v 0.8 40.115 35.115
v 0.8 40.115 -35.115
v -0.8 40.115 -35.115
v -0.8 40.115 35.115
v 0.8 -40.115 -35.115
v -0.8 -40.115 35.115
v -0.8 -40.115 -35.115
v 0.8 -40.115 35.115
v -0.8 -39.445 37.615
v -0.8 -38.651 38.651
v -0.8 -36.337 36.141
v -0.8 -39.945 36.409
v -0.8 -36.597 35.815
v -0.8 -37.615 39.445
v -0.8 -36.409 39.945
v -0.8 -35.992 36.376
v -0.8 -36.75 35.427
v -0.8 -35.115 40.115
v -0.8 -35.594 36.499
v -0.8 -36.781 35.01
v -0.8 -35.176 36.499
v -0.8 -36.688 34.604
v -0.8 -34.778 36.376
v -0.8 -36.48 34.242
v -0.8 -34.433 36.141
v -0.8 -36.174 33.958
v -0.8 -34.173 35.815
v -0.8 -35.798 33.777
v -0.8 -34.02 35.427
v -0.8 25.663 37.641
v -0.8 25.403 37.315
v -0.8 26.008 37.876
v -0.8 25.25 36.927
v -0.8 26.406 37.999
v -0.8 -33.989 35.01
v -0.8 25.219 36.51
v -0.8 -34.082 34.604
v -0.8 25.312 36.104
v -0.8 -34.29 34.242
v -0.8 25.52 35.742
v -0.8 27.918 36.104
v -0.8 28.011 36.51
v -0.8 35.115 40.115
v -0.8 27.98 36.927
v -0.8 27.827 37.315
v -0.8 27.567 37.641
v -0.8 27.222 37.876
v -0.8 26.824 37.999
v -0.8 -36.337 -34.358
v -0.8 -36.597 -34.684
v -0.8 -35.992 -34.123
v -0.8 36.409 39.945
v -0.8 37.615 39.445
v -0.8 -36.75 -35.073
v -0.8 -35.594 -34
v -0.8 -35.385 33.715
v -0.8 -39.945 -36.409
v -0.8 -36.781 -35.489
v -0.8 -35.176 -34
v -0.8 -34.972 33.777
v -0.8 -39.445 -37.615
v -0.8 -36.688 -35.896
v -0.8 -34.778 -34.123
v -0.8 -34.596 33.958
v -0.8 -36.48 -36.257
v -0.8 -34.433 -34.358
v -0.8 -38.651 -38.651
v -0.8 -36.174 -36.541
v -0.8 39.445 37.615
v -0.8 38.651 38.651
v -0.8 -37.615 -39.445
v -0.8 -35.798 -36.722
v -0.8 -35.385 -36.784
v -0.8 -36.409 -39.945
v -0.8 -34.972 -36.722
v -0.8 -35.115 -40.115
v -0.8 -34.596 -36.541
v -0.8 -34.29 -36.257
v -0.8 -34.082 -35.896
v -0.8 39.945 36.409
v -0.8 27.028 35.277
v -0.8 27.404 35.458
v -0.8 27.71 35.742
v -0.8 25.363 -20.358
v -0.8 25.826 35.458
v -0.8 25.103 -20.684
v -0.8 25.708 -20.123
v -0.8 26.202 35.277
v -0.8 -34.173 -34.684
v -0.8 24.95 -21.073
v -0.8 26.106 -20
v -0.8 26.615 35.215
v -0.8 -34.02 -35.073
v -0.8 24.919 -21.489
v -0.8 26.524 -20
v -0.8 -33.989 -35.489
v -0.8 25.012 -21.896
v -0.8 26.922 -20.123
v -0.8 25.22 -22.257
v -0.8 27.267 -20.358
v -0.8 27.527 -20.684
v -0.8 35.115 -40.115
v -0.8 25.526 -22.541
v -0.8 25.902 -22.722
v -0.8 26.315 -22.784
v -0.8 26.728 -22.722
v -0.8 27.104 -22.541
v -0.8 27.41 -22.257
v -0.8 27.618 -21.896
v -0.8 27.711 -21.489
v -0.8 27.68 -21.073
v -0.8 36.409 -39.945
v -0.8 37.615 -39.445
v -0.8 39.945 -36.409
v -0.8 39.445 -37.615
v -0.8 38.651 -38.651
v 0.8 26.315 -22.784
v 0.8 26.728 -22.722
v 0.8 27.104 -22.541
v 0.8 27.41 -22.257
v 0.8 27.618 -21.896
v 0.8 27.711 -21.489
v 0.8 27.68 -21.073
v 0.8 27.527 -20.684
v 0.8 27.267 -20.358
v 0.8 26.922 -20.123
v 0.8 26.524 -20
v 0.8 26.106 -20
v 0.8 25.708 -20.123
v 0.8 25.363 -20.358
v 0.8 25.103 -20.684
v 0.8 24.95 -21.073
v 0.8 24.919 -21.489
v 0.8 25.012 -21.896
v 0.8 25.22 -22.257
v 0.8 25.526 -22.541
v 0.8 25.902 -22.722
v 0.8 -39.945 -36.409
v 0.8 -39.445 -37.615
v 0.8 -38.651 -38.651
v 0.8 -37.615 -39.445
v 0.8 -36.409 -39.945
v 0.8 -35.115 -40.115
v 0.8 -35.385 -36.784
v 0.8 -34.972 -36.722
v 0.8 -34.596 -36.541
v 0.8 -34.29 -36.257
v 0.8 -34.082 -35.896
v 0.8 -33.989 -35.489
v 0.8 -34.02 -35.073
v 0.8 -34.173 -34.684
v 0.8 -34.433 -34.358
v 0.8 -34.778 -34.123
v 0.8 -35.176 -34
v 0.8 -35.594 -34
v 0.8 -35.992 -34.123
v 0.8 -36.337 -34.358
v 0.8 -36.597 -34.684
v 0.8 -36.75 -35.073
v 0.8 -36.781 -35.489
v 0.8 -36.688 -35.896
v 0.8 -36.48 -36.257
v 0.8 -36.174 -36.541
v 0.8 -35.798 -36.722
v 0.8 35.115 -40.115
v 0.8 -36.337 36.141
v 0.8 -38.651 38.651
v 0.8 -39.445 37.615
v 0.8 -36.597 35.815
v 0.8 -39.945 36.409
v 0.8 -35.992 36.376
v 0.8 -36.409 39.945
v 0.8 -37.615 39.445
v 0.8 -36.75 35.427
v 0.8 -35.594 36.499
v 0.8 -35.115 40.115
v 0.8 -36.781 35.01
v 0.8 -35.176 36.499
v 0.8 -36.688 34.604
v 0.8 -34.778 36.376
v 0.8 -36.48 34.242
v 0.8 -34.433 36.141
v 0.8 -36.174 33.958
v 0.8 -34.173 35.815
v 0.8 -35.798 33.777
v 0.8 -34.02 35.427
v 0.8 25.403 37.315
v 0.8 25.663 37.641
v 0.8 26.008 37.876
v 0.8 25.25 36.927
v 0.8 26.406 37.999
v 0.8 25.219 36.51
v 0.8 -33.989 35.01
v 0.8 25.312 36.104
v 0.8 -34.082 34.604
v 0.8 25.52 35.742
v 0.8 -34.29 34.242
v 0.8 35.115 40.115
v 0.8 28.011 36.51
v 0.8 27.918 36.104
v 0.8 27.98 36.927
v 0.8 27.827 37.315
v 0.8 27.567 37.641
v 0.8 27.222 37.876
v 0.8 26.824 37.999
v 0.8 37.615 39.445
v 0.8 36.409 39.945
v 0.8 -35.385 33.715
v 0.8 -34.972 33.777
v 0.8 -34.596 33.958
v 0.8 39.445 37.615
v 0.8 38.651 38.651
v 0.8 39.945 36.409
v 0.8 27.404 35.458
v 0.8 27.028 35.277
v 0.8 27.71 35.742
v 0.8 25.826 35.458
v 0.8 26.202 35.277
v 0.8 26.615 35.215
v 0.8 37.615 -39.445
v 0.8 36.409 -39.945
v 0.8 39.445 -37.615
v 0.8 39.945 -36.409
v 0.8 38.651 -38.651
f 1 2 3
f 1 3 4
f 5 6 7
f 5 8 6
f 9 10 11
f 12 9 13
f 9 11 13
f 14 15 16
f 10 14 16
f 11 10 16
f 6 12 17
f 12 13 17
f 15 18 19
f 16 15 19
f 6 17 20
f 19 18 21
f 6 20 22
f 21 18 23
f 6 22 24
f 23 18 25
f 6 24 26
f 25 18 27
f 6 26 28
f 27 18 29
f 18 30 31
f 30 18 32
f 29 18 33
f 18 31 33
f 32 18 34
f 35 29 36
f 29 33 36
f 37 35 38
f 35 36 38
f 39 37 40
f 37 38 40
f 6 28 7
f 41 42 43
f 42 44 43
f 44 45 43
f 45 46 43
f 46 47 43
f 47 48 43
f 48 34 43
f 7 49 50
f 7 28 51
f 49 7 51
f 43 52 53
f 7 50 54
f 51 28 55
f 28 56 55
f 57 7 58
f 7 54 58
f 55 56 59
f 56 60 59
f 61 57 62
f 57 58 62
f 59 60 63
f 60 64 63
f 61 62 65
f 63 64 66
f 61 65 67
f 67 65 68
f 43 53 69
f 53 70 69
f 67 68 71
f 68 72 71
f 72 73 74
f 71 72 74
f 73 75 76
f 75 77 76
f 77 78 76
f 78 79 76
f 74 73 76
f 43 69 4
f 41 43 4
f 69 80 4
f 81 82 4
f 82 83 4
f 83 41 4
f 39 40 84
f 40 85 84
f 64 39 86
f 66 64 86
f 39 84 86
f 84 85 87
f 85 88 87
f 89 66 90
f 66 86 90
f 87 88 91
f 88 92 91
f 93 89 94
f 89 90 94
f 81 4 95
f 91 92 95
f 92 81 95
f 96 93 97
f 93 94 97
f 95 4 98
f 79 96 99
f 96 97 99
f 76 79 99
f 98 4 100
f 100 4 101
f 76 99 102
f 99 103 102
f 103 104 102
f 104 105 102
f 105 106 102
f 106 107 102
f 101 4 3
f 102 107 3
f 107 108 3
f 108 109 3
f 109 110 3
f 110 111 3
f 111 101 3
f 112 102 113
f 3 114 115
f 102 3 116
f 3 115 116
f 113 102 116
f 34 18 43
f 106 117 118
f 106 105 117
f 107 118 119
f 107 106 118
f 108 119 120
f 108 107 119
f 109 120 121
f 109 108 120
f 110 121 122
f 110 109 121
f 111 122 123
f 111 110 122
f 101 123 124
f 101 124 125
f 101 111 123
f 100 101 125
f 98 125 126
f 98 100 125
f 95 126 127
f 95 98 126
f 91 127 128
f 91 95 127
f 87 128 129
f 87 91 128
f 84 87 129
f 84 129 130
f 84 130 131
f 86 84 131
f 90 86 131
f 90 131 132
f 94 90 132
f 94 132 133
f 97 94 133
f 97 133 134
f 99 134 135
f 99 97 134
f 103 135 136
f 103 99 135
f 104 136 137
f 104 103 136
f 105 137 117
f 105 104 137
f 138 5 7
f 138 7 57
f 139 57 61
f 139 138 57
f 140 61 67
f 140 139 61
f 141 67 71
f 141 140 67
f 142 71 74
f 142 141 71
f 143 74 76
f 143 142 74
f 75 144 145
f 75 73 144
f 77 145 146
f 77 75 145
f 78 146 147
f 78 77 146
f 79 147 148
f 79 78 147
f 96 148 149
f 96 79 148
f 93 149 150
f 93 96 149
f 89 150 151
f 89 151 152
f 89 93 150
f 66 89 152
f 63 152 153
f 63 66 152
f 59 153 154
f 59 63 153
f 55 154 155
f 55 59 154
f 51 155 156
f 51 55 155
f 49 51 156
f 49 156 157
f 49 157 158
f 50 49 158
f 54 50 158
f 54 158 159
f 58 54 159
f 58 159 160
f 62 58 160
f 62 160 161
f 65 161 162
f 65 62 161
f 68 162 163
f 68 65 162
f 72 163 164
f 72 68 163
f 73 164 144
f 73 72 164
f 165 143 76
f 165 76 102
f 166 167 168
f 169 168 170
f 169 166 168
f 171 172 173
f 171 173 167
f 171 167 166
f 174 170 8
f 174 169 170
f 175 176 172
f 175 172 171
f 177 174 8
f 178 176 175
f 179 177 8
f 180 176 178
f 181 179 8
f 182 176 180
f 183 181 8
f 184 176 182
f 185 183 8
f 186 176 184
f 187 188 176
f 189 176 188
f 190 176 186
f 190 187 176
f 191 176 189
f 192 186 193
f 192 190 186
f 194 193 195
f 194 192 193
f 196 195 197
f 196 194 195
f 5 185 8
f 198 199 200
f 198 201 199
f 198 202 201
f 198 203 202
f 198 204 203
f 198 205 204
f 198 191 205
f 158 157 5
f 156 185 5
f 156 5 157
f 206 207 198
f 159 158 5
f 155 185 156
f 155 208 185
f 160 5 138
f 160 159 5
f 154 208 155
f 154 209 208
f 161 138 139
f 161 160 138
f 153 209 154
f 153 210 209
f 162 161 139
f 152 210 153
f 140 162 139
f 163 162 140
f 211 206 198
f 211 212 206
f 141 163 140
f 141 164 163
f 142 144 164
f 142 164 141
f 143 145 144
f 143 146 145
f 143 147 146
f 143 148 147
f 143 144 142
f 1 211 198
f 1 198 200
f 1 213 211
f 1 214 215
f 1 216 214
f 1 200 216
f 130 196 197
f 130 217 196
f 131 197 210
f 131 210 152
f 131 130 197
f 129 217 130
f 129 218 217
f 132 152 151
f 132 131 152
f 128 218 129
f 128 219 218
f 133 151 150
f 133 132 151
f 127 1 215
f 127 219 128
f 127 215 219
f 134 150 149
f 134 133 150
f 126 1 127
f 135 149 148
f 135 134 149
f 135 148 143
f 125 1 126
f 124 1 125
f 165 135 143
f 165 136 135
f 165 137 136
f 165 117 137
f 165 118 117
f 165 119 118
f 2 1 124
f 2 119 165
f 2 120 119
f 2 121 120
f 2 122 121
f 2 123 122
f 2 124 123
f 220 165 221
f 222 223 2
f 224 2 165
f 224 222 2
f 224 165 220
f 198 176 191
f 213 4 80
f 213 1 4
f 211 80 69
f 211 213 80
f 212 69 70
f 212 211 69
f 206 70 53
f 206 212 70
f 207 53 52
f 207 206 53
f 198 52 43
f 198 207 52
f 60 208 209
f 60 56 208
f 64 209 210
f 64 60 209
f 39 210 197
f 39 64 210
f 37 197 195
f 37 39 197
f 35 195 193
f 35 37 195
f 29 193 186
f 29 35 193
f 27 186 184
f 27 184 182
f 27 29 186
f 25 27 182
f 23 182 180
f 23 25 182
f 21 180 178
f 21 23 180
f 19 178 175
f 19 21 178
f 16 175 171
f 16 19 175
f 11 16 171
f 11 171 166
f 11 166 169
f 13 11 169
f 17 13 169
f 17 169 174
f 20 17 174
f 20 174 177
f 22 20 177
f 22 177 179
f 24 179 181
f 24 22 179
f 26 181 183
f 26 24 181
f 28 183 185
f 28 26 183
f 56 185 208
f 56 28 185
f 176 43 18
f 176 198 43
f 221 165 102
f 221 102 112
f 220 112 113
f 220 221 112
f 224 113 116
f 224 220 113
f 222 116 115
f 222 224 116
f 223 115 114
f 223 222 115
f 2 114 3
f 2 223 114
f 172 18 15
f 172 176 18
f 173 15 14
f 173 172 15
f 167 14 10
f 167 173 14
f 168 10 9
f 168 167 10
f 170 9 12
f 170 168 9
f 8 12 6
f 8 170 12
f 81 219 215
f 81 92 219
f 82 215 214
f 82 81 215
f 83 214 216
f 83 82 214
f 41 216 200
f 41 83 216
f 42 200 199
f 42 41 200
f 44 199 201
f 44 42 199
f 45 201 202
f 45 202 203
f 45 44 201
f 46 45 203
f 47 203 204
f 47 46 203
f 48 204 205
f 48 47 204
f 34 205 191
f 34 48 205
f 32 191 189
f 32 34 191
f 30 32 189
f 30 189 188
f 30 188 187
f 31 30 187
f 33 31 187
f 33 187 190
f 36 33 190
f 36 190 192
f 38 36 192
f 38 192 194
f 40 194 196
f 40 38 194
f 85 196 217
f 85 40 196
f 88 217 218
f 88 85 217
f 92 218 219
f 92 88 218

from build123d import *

# Parameters (mm, degrees)
SKETCH1_R           = 1.4
BOSS_EXTRUDE1_DEPTH = 0.8


with BuildPart() as part:
    # Sketch1 → Boss-Extrude1 (new, symmetric)
    with BuildSketch(Plane(origin=(0, 0, 0), x_dir=(0, 0, -1), z_dir=(1, 0, 0))):
        with BuildLine():
            Line((-35.115, -40.115), (35.115, -40.115))
            ThreePointArc((35.115, -40.115), (38.650533906, -38.650533906), (40.115, -35.115))
            Line((40.115, -35.115), (40.115, 35.115))
            ThreePointArc((40.115, 35.115), (38.650533906, 38.650533906), (35.115, 40.115))
            Line((35.115, 40.115), (-35.115, 40.115))
            ThreePointArc((-35.115, 40.115), (-38.650533906, 38.650533906), (-40.115, 35.115))
            Line((-40.115, 35.115), (-40.115, -35.115))
            ThreePointArc((-40.115, -35.115), (-38.650533906, -38.650533906), (-35.115, -40.115))
        make_face()
        with Locations((-36.615, 26.615)):
            Circle(SKETCH1_R, mode=Mode.SUBTRACT)
        with Locations((21.384224133, 26.315)):
            Circle(SKETCH1_R, mode=Mode.SUBTRACT)
        with Locations((35.384224133, -35.385)):
            Circle(SKETCH1_R, mode=Mode.SUBTRACT)
        with Locations((-35.115, -35.385)):
            Circle(SKETCH1_R, mode=Mode.SUBTRACT)
    extrude(amount=BOSS_EXTRUDE1_DEPTH, both=True)


solid = part.part
